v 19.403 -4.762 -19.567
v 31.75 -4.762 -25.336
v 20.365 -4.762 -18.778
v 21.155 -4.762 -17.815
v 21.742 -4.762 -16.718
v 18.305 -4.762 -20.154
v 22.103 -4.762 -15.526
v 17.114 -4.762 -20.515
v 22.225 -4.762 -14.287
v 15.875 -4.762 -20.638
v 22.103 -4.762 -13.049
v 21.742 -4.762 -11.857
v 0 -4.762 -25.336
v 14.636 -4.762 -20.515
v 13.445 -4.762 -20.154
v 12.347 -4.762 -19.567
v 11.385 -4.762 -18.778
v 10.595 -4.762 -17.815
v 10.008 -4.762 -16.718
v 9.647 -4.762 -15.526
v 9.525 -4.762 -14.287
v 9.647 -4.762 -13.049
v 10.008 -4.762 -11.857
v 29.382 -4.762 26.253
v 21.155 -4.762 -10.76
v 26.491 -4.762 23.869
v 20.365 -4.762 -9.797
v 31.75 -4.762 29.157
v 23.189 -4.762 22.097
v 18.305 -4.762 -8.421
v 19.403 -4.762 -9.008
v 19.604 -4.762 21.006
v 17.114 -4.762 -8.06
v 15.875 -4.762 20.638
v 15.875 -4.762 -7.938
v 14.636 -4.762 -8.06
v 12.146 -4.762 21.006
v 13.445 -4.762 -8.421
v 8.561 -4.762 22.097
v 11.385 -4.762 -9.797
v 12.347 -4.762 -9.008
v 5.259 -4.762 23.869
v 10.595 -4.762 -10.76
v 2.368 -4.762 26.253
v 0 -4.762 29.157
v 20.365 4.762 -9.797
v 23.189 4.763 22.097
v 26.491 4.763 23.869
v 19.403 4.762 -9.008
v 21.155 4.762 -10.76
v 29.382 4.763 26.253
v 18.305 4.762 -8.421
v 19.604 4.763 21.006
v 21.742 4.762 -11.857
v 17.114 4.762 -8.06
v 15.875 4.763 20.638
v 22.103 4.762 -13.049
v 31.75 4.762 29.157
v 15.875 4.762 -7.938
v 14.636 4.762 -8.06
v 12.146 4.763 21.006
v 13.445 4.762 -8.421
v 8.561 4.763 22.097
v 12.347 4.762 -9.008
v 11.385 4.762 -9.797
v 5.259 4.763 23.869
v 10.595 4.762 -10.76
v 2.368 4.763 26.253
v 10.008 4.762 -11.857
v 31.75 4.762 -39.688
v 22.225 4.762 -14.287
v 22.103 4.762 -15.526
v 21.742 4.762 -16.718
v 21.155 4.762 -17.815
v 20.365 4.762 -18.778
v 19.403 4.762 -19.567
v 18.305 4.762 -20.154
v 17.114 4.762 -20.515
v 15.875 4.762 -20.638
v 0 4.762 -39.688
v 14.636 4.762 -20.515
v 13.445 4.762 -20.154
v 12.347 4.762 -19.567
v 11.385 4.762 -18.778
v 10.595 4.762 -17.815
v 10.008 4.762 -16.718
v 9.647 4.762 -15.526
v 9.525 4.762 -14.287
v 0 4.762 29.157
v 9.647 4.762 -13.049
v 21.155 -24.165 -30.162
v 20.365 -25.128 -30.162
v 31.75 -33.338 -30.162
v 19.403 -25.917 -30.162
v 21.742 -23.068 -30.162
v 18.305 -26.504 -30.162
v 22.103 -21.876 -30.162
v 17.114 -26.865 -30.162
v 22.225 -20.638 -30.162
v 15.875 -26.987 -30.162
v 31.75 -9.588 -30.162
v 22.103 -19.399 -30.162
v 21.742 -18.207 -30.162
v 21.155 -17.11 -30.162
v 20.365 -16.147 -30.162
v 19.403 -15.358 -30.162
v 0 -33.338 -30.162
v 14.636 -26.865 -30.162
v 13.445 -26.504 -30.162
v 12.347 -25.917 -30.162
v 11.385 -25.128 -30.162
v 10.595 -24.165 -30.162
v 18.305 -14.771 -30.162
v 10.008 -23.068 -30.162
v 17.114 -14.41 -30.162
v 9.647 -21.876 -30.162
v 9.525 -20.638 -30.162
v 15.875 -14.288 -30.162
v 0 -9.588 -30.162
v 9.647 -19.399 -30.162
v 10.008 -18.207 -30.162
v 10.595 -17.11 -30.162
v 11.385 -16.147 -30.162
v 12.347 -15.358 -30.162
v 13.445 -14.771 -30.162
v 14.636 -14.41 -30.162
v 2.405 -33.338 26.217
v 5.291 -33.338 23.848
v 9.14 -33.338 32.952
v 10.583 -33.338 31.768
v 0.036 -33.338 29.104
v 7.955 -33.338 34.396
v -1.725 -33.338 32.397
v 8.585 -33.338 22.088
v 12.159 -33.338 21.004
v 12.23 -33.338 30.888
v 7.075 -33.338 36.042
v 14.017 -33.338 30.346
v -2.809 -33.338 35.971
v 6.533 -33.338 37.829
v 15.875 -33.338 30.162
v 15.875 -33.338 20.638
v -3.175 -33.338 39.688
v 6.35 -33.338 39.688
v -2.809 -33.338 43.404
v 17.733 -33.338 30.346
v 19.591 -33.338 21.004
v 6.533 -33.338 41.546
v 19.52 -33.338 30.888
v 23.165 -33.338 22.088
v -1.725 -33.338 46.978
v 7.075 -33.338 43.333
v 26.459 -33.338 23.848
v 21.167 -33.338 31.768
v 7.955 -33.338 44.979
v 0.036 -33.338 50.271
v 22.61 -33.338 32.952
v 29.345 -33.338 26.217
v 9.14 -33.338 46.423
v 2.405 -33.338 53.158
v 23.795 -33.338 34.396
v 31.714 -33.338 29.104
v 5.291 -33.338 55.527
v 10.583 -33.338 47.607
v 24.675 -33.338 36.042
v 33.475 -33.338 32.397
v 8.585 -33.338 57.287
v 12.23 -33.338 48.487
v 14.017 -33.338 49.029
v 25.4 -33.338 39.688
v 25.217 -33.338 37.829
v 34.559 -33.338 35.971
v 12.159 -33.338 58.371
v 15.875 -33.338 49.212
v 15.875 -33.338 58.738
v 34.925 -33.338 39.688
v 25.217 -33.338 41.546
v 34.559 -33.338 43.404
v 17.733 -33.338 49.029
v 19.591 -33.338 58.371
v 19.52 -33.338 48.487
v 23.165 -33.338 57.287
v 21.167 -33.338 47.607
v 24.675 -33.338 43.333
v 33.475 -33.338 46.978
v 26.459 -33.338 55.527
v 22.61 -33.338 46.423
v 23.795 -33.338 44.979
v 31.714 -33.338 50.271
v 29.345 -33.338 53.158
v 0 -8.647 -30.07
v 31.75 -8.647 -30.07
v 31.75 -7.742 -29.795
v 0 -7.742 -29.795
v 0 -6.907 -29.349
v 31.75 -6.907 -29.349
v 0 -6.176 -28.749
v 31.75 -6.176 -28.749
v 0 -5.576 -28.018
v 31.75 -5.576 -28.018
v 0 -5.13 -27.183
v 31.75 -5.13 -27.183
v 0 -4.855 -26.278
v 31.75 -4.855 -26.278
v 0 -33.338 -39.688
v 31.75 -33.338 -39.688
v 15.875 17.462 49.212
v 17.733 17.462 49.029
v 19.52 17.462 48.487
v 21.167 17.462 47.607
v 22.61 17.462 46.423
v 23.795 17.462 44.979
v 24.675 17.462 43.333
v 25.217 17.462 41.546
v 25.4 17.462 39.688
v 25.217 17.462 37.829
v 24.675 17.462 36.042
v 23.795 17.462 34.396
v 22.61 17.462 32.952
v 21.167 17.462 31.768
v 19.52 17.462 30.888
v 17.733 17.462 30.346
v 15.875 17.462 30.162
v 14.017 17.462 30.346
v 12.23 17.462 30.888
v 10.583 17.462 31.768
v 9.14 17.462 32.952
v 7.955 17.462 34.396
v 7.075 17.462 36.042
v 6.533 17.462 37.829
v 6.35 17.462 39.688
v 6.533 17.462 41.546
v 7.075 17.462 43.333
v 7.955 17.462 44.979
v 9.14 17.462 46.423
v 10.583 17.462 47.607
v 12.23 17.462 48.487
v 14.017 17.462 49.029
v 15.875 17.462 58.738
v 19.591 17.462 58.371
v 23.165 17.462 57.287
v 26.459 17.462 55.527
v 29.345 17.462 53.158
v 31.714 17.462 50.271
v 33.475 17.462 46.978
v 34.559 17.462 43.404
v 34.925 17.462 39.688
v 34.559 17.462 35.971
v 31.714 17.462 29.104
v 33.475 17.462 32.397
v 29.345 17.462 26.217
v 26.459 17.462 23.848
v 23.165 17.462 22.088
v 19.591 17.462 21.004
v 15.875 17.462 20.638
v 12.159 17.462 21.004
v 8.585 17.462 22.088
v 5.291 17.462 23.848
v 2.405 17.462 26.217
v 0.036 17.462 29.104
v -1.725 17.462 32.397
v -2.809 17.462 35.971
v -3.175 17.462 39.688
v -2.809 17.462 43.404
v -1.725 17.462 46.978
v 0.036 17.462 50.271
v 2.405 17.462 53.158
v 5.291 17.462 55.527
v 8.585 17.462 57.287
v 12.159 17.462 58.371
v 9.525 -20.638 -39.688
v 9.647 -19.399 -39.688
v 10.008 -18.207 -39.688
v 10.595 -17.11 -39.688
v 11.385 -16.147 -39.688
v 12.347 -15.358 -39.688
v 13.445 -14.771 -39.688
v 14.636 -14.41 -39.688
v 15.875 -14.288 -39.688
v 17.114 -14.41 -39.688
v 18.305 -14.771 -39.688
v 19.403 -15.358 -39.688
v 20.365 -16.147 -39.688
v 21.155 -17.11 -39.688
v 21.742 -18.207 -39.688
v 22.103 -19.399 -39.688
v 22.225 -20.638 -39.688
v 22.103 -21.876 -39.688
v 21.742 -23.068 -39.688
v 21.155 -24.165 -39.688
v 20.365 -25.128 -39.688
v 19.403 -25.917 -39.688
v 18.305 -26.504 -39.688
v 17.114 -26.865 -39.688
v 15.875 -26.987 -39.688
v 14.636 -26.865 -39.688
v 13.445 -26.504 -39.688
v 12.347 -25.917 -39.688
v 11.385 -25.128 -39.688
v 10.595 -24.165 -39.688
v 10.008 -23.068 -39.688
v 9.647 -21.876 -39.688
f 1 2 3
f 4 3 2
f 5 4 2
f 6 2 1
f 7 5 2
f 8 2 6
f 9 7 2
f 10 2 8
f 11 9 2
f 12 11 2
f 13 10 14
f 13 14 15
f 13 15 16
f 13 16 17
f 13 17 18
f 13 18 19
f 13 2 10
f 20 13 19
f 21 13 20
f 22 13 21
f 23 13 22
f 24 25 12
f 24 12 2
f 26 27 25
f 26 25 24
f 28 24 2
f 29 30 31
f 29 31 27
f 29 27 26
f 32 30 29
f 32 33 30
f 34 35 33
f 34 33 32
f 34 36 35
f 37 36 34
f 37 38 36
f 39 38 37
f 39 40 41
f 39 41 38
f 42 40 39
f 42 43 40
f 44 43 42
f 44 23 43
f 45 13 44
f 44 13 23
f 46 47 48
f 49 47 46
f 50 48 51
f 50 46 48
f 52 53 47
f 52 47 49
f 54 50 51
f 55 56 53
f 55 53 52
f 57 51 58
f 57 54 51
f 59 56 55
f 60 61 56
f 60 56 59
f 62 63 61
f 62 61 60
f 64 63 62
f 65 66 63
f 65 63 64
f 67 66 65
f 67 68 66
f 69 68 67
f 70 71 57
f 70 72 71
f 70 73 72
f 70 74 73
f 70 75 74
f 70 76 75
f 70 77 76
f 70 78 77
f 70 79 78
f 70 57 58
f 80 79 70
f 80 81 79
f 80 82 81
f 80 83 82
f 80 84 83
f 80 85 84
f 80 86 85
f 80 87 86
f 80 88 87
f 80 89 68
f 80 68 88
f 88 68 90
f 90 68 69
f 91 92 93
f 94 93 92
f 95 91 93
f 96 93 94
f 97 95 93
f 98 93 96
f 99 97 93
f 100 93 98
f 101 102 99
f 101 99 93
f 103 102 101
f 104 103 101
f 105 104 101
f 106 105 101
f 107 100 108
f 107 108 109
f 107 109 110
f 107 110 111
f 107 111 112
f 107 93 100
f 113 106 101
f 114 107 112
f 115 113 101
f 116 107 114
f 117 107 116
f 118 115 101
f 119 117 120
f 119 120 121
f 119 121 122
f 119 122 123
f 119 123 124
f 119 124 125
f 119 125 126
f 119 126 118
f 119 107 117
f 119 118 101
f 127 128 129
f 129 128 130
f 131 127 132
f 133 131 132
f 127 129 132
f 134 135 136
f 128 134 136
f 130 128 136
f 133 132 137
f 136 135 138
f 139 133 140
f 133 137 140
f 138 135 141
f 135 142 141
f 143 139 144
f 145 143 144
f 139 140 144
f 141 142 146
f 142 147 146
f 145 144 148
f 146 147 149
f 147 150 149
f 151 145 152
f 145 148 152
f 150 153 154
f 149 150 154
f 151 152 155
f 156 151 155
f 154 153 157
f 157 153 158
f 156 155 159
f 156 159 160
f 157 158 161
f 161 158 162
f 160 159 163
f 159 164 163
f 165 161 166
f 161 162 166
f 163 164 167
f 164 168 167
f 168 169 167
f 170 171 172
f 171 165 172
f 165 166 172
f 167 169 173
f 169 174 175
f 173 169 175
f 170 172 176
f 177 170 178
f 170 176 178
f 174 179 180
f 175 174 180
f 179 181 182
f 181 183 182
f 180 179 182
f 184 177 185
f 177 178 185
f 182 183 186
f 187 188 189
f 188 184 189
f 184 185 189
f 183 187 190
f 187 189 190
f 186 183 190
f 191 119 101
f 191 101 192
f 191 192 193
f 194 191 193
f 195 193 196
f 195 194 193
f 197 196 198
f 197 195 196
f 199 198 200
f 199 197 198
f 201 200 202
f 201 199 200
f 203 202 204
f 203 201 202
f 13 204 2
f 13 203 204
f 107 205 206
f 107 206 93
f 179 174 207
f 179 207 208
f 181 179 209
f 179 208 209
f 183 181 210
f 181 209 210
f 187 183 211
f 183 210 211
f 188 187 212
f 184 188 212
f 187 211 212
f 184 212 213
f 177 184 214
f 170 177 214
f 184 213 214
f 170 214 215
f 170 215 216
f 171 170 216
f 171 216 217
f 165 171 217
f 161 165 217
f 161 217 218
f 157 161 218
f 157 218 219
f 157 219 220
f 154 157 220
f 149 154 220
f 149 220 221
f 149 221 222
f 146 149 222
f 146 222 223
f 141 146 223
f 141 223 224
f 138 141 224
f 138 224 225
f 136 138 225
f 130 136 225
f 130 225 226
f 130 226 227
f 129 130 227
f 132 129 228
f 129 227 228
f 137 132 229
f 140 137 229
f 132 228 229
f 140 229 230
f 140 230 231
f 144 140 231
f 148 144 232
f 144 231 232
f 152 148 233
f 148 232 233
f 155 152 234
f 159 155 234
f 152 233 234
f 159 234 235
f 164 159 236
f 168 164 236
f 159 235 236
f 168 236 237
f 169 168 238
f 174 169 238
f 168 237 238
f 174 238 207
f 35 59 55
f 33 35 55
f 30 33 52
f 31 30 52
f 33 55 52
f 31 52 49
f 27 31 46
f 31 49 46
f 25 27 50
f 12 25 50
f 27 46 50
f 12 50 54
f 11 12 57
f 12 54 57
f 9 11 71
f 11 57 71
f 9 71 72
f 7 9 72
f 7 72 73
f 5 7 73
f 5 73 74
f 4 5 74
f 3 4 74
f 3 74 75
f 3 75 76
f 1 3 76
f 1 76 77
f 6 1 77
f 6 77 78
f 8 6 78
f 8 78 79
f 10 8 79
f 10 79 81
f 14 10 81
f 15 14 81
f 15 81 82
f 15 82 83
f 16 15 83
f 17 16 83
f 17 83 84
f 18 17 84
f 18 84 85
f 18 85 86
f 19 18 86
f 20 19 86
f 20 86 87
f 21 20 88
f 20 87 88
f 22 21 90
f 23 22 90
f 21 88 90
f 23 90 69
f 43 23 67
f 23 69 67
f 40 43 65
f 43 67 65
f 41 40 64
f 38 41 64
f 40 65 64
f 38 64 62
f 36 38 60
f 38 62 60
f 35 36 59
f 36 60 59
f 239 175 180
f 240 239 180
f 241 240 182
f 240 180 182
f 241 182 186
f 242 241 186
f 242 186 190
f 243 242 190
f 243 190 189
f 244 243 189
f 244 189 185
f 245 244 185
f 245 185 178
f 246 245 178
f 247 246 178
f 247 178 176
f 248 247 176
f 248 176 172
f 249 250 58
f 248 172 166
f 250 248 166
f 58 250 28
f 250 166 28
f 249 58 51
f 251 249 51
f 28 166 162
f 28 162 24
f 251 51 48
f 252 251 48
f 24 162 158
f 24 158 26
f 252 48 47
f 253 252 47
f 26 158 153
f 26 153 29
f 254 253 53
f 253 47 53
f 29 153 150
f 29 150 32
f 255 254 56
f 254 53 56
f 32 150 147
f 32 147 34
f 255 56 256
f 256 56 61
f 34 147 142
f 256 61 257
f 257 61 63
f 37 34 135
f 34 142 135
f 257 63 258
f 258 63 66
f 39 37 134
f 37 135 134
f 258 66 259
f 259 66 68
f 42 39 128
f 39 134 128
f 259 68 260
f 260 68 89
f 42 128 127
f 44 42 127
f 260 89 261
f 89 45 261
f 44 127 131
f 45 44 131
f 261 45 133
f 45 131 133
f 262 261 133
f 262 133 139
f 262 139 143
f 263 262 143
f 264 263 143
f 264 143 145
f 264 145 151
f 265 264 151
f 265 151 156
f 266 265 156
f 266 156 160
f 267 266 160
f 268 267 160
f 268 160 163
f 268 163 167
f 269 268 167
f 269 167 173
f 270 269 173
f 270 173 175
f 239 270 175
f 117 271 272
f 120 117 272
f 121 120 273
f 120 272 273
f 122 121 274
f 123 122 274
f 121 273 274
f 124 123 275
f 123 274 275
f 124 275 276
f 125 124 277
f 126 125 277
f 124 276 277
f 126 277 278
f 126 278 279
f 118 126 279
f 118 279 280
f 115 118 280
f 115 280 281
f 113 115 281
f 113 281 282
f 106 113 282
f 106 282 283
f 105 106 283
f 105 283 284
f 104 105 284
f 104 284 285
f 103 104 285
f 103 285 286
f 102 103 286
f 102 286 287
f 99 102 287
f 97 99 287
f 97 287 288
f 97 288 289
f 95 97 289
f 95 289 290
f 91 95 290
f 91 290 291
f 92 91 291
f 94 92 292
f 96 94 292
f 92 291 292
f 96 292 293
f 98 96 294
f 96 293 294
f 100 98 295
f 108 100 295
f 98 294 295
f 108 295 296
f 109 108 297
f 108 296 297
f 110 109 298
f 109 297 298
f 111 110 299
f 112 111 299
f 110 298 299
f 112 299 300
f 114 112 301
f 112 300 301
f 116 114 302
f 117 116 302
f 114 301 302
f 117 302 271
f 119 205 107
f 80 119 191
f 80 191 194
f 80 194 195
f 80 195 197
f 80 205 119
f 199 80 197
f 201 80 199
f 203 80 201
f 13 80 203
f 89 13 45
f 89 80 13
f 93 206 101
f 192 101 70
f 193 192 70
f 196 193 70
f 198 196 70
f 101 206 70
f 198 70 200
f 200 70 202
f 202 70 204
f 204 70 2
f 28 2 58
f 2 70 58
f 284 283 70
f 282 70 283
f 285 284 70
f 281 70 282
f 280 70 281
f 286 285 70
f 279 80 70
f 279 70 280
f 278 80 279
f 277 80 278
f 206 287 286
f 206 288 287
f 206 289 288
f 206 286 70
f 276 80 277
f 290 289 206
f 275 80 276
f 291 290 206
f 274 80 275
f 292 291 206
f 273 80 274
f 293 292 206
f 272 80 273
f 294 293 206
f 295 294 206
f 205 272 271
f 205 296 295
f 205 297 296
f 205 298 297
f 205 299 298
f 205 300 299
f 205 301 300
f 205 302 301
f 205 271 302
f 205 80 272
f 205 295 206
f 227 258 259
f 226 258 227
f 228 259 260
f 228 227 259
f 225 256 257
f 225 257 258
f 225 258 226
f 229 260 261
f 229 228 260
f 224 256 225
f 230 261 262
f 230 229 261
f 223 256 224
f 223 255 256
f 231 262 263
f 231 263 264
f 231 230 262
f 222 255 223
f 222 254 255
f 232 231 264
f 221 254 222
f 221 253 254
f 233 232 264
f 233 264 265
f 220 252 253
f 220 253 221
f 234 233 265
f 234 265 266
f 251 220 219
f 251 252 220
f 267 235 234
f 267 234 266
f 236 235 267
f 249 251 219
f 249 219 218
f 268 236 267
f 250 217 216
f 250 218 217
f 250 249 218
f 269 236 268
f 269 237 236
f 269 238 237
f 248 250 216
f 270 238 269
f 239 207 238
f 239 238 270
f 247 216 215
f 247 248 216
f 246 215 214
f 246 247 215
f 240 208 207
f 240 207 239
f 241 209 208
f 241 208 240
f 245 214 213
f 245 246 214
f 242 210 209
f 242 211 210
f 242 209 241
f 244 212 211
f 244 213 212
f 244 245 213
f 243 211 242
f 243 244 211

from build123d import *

# Parameters (mm, degrees)
SALIENTE_EXTRUIR1_DEPTH      = 31.75
CORTAR_EXTRUIR1_REACH        = 93.76
CROQUIS5_R                   = 6.35
CORTAR_EXTRUIR2_REACH        = 65.52
CROQUIS6_R                   = 6.35
SALIENTE_EXTRUIR2_DEPTH      = 12.7
SALIENTE_EXTRUIR2_DEPTH_BACK = 38.1
CROQUIS7_R                   = 19.05
CROQUIS8_R                   = 9.525
CORTAR_EXTRUIR3_DEPTH        = 86.149806408


with BuildPart() as part:
    # Croquis3 → Saliente-Extruir1 (new body)
    with BuildSketch(Plane(origin=(0, 0, 0), x_dir=(0, 0, -1), z_dir=(1, 0, 0))):
        with BuildLine():
            Line((39.6875, 4.7625), (39.6875, -33.3375))
            Line((39.6875, -33.3375), (30.1625, -33.3375))
            Line((30.1625, -33.3375), (30.1625, -9.5885))
            ThreePointArc((30.1625, -9.5885), (28.748997326, -6.176002674), (25.3365, -4.7625))
            Line((25.3365, -4.7625), (-39.6875, -4.7625))
            Line((-39.6875, -4.7625), (-39.6875, 4.7625))
            Line((-39.6875, 4.7625), (39.6875, 4.7625))
        make_face()
    extrude(amount=SALIENTE_EXTRUIR1_DEPTH)

    # Croquis5 → Cortar-Extruir1 (cut, up to next)
    with BuildSketch(Plane(origin=(0, 0, -39.6875), x_dir=(-1, 0, 0), z_dir=(0, 0, -1)), mode=Mode.PRIVATE) as cortar_extruir1_sk1:
        with Locations((-15.875, -20.6375)):
            Circle(CROQUIS5_R)
    cortar_extruir1_tool1 = extrude(cortar_extruir1_sk1.sketch, amount=-CORTAR_EXTRUIR1_REACH, mode=Mode.PRIVATE) & part.part
    add(cortar_extruir1_tool1.solids().sort_by_distance((15.875, -20.6375, -39.6875))[0], mode=Mode.SUBTRACT)

    # Croquis6 → Cortar-Extruir2 (cut, up to next)
    with BuildSketch(Plane(origin=(0, 4.7625, 0), x_dir=(1, 0, 0), z_dir=(0, 1, 0)), mode=Mode.PRIVATE) as cortar_extruir2_sk1:
        with Locations(Location((15.875, 14.2875, 0), (0, 0, 270))):
            Circle(CROQUIS6_R)
    cortar_extruir2_tool1 = extrude(cortar_extruir2_sk1.sketch, amount=-CORTAR_EXTRUIR2_REACH, mode=Mode.PRIVATE) & part.part
    add(cortar_extruir2_tool1.solids().sort_by_distance((15.875, 4.7625, -14.2875))[0], mode=Mode.SUBTRACT)

    # Croquis7 → Saliente-Extruir2 (add, two sides: drawn at the far end of the back side and taken through both)
    with BuildSketch(Plane(origin=(0, 4.7625, 0), x_dir=(1, 0, 0), z_dir=(0, 1, 0)).offset(-SALIENTE_EXTRUIR2_DEPTH_BACK)):
        with Locations(Location((15.875, -39.6875, 0), (0, 0, 270))):
            Circle(CROQUIS7_R)
    extrude(amount=SALIENTE_EXTRUIR2_DEPTH + SALIENTE_EXTRUIR2_DEPTH_BACK)

    # Croquis8 → Cortar-Extruir3 (cut, through all)
    with BuildSketch(Plane(origin=(0, 17.4625, 0), x_dir=(1, 0, 0), z_dir=(0, 1, 0))):
        with Locations(Location((15.875, -39.6875, 0), (0, 0, 270))):
            Circle(CROQUIS8_R)
    extrude(amount=-CORTAR_EXTRUIR3_DEPTH, mode=Mode.SUBTRACT)


solid = part.part
